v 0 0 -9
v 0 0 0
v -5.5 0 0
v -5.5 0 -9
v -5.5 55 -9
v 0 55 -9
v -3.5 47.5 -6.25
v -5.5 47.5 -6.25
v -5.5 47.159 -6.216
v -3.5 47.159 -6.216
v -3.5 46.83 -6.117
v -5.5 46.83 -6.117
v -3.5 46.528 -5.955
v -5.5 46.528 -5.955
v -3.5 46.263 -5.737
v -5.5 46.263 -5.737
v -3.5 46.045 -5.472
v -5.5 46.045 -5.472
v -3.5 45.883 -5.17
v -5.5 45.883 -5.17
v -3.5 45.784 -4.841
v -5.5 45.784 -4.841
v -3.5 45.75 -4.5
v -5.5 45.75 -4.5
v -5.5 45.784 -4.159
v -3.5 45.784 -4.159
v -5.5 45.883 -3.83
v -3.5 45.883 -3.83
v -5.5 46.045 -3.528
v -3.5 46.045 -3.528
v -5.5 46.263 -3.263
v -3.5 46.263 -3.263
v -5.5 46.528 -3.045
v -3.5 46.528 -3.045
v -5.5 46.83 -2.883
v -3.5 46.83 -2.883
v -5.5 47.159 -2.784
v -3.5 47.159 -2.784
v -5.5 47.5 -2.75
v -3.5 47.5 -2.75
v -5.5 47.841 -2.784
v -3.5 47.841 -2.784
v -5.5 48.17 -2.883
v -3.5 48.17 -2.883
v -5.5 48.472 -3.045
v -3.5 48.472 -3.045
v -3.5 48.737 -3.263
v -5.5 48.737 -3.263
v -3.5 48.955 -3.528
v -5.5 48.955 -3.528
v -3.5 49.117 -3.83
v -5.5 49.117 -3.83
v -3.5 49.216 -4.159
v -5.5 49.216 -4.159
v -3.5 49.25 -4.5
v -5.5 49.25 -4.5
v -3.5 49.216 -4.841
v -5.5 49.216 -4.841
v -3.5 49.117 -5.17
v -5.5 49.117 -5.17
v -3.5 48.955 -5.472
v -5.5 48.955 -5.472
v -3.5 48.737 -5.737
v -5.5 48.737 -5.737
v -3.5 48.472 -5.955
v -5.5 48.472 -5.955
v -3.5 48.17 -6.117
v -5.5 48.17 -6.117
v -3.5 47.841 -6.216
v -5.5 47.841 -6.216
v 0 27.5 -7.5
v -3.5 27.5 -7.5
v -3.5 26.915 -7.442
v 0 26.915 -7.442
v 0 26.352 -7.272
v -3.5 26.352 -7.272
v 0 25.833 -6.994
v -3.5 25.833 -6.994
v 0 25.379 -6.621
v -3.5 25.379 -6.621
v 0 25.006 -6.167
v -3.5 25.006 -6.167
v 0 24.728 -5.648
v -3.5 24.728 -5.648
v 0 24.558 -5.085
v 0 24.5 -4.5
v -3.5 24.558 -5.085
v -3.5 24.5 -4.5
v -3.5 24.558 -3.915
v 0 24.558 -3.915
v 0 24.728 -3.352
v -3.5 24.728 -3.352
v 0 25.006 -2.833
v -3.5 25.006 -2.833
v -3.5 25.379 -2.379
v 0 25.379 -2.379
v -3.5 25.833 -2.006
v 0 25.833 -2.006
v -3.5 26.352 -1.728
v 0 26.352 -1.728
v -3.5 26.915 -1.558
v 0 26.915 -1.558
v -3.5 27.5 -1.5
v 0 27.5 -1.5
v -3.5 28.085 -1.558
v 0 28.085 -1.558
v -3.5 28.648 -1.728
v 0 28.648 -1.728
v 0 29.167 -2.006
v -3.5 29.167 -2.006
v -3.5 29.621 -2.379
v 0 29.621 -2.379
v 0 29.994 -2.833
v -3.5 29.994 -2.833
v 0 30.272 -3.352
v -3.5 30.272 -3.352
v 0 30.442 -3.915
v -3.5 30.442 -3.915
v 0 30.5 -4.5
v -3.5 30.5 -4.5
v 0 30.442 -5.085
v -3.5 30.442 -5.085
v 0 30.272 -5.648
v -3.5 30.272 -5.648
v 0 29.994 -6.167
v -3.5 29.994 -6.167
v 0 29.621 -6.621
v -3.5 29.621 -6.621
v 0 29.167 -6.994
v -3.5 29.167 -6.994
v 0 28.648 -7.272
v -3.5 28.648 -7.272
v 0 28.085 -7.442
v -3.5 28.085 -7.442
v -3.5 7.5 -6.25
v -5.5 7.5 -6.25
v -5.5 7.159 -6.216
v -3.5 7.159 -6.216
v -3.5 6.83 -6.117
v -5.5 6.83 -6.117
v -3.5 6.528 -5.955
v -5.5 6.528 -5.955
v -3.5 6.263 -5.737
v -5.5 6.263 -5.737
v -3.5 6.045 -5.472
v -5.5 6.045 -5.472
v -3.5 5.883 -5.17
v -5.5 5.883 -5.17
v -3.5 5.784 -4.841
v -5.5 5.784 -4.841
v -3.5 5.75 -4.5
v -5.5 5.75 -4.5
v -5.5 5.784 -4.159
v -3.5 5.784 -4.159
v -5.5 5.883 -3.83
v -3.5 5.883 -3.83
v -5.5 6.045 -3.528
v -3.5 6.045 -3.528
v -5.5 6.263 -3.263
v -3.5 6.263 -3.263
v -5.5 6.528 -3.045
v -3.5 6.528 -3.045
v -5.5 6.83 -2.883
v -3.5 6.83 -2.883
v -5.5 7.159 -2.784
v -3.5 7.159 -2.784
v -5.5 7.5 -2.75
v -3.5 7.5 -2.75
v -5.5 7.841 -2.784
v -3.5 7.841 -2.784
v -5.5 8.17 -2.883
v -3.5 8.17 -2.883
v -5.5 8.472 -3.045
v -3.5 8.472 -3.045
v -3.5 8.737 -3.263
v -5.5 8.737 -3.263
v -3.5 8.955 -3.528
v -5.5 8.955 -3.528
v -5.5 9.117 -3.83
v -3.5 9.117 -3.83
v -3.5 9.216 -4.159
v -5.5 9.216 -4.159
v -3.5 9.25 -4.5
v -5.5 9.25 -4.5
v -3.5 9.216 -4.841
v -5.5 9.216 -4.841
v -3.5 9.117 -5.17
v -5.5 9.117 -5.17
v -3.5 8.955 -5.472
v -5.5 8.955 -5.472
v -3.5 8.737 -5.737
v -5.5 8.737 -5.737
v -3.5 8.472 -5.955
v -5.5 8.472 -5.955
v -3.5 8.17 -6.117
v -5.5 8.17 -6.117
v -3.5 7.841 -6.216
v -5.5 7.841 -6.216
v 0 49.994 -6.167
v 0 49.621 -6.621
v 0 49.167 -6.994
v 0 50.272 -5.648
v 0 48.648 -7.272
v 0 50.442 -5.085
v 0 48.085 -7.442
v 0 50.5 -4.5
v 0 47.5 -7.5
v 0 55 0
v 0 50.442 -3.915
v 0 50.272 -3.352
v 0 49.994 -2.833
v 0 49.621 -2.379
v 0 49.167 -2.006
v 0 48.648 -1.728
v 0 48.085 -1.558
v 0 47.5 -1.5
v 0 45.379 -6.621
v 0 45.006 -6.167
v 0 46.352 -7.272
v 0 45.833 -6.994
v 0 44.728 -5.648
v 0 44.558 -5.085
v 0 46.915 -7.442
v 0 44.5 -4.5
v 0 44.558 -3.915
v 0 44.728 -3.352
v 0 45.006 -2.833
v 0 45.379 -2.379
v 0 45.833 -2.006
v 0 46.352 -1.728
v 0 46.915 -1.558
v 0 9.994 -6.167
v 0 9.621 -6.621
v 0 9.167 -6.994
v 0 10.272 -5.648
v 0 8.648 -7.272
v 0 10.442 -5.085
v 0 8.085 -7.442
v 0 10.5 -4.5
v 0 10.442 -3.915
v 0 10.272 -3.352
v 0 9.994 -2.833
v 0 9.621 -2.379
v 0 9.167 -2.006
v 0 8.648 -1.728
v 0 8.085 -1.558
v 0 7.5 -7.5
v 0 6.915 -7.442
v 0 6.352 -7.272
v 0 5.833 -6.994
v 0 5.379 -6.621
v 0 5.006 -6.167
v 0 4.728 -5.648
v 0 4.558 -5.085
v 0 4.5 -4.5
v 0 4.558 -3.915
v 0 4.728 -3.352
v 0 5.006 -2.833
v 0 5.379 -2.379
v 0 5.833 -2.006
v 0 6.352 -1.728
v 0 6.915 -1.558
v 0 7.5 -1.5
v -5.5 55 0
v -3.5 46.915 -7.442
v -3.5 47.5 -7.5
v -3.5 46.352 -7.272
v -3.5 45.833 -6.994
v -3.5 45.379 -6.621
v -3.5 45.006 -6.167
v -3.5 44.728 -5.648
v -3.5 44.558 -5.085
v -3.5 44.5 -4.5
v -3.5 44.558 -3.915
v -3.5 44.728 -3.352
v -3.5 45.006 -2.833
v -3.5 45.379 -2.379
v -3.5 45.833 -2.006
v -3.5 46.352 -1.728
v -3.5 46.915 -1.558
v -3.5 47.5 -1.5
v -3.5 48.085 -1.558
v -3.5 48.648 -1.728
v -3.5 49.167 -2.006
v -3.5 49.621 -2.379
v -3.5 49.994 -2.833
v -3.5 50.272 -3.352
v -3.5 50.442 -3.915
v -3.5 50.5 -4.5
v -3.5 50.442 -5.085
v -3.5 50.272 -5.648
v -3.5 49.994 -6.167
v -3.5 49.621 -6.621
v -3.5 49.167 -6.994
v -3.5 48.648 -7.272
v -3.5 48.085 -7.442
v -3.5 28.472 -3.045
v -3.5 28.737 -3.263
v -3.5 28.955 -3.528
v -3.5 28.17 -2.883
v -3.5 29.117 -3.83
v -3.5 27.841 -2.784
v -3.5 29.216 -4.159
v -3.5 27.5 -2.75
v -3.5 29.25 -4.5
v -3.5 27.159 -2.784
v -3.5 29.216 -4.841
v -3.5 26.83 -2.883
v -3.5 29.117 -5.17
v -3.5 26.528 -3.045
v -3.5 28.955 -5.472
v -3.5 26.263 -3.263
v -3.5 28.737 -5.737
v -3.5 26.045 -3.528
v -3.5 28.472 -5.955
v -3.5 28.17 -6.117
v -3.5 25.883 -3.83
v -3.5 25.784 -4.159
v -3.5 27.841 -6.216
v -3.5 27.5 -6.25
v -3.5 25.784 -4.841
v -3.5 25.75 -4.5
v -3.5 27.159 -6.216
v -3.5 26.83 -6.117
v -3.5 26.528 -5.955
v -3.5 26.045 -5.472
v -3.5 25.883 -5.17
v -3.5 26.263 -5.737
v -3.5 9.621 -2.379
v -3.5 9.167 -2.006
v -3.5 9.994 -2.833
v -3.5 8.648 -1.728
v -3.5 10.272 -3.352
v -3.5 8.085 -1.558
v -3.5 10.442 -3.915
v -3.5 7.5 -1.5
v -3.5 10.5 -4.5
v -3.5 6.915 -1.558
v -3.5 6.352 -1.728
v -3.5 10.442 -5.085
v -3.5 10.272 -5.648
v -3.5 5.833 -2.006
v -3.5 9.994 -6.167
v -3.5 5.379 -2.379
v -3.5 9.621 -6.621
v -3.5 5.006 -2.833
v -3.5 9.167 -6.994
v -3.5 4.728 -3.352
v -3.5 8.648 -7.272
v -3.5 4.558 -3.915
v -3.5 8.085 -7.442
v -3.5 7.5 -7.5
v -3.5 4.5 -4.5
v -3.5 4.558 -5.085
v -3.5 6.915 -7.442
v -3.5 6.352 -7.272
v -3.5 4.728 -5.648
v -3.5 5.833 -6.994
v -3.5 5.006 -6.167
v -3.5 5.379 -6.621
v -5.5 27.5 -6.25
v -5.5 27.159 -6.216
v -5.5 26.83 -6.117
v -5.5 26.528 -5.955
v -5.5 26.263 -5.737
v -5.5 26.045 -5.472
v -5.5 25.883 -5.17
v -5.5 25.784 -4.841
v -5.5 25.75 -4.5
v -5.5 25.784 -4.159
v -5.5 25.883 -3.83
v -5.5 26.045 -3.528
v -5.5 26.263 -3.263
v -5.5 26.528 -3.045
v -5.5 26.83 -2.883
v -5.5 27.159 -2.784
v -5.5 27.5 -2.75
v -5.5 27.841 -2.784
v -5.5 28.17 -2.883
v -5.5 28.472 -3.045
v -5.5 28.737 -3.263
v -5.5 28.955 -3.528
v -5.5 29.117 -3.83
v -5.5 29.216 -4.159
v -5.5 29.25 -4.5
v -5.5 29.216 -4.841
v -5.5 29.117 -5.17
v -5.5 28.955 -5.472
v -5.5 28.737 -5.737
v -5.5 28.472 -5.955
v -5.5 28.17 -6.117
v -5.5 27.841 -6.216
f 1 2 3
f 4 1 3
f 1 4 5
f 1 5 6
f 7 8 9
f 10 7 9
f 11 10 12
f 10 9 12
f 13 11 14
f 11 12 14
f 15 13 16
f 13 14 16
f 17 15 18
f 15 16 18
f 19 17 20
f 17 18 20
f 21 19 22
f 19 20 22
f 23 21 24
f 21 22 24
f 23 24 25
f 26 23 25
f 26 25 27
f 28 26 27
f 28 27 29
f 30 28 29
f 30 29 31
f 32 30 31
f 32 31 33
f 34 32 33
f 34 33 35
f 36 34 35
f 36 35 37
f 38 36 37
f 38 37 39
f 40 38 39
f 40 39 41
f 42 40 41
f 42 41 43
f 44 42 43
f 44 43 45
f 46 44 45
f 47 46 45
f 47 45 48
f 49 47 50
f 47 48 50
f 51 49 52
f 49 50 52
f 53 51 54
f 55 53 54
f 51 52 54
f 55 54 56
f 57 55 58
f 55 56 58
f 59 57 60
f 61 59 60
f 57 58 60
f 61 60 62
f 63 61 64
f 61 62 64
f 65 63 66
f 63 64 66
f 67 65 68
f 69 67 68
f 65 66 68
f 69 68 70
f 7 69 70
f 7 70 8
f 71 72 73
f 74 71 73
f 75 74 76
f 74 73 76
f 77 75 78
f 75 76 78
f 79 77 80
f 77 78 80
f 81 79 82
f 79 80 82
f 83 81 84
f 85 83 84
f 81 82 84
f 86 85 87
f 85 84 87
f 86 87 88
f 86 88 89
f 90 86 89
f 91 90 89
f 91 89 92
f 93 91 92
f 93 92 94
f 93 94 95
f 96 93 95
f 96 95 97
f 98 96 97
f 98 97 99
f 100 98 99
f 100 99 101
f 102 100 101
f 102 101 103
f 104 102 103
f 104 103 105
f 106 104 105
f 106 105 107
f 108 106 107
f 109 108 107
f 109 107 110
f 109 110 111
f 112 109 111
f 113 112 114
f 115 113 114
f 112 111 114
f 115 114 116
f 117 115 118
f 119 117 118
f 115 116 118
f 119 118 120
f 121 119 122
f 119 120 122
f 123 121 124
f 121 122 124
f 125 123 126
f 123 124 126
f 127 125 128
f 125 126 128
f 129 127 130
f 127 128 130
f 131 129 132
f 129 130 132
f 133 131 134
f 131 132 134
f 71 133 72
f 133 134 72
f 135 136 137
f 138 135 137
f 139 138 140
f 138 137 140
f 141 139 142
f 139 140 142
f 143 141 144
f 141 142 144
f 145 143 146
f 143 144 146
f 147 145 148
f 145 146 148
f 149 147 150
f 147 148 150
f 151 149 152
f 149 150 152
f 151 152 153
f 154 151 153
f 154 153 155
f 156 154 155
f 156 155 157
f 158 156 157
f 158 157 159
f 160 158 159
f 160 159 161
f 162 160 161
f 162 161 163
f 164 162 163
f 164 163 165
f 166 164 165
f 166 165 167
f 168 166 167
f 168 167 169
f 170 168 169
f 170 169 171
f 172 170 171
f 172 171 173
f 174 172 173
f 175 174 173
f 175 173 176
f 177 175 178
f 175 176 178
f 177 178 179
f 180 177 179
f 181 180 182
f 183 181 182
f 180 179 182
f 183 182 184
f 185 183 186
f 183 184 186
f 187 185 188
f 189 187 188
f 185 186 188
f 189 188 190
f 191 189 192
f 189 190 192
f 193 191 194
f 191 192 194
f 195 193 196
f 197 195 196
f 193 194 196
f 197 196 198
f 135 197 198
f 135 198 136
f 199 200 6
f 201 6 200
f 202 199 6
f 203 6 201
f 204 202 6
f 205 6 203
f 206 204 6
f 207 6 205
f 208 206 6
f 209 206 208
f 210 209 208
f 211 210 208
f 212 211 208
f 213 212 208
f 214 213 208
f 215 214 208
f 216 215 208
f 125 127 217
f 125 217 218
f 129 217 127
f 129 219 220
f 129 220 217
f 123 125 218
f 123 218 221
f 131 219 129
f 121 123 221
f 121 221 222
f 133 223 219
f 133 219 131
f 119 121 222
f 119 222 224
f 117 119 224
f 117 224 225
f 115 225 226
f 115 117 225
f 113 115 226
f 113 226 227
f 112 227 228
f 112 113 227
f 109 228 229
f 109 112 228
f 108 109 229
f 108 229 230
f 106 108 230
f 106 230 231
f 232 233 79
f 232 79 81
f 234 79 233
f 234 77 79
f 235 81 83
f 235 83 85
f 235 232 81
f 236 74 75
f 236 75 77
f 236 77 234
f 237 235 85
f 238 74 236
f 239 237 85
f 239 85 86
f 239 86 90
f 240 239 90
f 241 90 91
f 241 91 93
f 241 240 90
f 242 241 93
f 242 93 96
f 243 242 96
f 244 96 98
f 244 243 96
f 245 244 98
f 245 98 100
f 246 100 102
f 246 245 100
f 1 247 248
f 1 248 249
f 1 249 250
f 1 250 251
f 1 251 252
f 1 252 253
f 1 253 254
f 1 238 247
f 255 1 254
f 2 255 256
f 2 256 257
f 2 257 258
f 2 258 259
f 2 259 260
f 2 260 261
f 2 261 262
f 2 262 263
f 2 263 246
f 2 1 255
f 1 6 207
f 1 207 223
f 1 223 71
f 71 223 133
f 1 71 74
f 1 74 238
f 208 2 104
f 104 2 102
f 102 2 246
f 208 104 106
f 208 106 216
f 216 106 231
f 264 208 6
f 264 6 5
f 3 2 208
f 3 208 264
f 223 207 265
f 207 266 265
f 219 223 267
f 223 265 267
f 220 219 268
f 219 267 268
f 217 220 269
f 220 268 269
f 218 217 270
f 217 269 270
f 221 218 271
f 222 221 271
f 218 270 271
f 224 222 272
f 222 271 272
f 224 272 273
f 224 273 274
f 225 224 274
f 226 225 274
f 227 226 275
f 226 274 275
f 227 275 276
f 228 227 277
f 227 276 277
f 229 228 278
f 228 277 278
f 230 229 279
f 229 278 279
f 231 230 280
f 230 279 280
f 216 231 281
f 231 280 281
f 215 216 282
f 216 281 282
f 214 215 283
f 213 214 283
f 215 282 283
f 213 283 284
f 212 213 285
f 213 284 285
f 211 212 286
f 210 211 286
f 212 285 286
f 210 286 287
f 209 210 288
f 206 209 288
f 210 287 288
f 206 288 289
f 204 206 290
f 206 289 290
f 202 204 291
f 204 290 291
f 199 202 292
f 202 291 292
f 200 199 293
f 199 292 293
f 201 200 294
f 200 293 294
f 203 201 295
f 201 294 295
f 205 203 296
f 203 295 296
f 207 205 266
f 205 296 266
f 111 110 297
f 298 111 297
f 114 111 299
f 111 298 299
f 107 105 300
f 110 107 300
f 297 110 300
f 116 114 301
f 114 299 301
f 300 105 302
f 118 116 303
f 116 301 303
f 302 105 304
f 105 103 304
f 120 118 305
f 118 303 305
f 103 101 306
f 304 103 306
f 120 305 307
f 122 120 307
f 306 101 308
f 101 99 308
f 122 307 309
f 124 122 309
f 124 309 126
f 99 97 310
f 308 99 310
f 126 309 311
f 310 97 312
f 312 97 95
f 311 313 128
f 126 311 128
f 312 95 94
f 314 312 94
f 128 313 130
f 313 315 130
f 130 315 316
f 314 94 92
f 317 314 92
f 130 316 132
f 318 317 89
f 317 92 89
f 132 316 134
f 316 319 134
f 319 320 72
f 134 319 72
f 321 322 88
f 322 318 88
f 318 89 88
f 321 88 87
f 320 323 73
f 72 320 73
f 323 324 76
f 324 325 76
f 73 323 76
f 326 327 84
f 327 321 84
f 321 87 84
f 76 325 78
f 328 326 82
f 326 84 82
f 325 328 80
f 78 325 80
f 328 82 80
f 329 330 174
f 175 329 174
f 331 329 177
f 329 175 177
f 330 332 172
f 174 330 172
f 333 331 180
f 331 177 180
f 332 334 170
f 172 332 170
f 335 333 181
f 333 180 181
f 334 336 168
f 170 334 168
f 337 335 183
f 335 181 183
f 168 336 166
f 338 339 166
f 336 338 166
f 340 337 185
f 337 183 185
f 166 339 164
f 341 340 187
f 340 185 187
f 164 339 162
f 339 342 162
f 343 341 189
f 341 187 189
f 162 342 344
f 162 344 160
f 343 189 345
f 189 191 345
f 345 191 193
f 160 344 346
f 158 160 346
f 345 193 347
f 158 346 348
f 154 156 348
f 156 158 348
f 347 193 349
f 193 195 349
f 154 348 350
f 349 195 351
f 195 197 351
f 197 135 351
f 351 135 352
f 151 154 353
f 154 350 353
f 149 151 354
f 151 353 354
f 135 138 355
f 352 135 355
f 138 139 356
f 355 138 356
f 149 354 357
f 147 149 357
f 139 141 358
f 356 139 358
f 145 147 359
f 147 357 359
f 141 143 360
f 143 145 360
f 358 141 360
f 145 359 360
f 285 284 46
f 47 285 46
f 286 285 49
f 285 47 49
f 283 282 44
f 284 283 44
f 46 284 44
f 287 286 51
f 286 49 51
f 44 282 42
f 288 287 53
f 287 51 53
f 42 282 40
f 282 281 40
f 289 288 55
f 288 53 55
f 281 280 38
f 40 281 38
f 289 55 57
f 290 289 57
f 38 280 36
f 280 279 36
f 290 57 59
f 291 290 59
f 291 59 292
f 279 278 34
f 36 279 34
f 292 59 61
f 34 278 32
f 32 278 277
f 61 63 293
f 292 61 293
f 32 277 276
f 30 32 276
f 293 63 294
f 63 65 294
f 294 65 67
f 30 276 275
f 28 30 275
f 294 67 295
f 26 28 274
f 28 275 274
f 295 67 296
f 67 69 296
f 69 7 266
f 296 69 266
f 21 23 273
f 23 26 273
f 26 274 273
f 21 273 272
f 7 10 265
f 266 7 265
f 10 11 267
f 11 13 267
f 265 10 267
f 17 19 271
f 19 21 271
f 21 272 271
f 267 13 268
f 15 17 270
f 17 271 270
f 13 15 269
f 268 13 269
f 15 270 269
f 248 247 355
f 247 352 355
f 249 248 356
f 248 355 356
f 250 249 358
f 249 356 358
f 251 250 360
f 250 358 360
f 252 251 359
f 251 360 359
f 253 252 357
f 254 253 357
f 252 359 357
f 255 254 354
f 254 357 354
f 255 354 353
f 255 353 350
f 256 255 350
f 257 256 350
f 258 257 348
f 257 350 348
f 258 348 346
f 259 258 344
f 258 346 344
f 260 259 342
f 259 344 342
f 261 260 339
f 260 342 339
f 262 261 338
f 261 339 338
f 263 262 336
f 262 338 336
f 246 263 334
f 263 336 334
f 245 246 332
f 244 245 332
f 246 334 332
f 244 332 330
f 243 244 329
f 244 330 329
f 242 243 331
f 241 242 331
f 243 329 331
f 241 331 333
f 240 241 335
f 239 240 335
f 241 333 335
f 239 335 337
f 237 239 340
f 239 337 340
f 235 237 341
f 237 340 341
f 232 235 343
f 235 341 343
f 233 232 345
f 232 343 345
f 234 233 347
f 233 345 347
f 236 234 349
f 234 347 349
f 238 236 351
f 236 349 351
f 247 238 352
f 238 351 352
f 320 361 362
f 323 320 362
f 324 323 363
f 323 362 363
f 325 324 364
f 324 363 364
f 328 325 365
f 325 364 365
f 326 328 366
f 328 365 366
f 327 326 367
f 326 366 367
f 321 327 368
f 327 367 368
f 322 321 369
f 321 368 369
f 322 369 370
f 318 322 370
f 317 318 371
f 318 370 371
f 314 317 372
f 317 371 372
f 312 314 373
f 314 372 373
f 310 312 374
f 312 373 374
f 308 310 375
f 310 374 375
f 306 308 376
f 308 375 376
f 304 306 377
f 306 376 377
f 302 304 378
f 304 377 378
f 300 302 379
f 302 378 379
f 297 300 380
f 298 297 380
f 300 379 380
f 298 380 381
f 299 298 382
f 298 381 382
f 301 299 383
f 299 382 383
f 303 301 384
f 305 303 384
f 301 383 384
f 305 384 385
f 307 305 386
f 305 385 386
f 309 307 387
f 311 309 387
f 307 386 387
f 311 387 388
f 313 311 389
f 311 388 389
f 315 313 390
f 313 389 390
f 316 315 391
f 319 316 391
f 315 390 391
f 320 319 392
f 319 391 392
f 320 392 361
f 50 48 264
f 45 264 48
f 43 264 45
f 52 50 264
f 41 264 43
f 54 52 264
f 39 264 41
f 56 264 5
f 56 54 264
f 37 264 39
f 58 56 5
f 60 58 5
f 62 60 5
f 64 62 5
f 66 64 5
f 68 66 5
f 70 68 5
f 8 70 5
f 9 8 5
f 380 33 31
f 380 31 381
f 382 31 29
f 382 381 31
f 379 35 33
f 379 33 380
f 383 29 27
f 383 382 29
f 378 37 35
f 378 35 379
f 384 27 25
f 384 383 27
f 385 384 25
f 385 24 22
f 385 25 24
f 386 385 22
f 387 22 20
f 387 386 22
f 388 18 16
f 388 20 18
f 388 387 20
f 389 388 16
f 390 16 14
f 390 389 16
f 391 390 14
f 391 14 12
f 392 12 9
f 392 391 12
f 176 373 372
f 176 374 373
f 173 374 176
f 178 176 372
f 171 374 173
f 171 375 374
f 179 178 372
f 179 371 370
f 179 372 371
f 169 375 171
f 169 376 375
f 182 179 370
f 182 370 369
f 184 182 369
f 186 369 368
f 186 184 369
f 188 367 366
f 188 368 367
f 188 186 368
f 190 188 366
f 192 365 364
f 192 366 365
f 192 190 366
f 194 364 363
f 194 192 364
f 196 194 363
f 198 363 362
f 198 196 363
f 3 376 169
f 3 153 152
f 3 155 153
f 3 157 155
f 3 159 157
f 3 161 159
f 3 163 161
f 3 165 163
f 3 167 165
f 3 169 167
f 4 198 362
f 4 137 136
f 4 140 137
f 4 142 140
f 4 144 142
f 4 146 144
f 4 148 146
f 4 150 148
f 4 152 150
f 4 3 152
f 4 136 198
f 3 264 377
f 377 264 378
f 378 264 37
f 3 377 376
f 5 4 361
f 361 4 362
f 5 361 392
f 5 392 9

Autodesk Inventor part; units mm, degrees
ref_plane "YZ Plane" through (0, 0, 0) normal (1, 0, 0) x (0, 1, 0)
ref_plane "XZ Plane" through (0, 0, 0) normal (0, 1, 0) x (-1, 0, 0)
ref_plane "XY Plane" through (0, 0, 0) normal (0, 0, 1) x (1, 0, 0)
sketch "スケッチ1" plane through (0, 0, 0) normal (0, 1, 0) x (-1, 0, 0)
  line L0 (0, 0) -> (5.5, 0)
  line L1 (5.5, 0) -> (5.5, -9)
  line L2 (5.5, -9) -> (0, -9)
  line L3 (0, -9) -> (0, 0)
  dimension "d0" = 5.5
  dimension "d1" = 9
extrude "押し出し1" add sketch "スケッチ1" along normal blind 55
sketch "スケッチ2" plane through (0, 0, 0) normal (1, 0, 0) x (0, 0, -1)
  line L0 (0, 55) -> (9, 55) projected
  line L1 (4.5, 55) -> (4.5, 0)
  line L2 (9, 0) -> (0, 0) projected
  point P0 (4.5, 27.5)
  point P1 (4.5, 47.5)
  point P2 (4.5, 7.5)
  dimension "d4" = 27.5
  dimension "d5" = 20
  dimension "d6" = 20
hole "穴1" at (0, 27.5, -4.5) at (0, 47.5, -4.5) at (0, 7.5, -4.5) direction (-1, 0, 0) diameter 3.5 depth 8 tip angle 118 counterbore diameter 6 counterbore depth 3.5
properties part number "rail_SSEB10"
